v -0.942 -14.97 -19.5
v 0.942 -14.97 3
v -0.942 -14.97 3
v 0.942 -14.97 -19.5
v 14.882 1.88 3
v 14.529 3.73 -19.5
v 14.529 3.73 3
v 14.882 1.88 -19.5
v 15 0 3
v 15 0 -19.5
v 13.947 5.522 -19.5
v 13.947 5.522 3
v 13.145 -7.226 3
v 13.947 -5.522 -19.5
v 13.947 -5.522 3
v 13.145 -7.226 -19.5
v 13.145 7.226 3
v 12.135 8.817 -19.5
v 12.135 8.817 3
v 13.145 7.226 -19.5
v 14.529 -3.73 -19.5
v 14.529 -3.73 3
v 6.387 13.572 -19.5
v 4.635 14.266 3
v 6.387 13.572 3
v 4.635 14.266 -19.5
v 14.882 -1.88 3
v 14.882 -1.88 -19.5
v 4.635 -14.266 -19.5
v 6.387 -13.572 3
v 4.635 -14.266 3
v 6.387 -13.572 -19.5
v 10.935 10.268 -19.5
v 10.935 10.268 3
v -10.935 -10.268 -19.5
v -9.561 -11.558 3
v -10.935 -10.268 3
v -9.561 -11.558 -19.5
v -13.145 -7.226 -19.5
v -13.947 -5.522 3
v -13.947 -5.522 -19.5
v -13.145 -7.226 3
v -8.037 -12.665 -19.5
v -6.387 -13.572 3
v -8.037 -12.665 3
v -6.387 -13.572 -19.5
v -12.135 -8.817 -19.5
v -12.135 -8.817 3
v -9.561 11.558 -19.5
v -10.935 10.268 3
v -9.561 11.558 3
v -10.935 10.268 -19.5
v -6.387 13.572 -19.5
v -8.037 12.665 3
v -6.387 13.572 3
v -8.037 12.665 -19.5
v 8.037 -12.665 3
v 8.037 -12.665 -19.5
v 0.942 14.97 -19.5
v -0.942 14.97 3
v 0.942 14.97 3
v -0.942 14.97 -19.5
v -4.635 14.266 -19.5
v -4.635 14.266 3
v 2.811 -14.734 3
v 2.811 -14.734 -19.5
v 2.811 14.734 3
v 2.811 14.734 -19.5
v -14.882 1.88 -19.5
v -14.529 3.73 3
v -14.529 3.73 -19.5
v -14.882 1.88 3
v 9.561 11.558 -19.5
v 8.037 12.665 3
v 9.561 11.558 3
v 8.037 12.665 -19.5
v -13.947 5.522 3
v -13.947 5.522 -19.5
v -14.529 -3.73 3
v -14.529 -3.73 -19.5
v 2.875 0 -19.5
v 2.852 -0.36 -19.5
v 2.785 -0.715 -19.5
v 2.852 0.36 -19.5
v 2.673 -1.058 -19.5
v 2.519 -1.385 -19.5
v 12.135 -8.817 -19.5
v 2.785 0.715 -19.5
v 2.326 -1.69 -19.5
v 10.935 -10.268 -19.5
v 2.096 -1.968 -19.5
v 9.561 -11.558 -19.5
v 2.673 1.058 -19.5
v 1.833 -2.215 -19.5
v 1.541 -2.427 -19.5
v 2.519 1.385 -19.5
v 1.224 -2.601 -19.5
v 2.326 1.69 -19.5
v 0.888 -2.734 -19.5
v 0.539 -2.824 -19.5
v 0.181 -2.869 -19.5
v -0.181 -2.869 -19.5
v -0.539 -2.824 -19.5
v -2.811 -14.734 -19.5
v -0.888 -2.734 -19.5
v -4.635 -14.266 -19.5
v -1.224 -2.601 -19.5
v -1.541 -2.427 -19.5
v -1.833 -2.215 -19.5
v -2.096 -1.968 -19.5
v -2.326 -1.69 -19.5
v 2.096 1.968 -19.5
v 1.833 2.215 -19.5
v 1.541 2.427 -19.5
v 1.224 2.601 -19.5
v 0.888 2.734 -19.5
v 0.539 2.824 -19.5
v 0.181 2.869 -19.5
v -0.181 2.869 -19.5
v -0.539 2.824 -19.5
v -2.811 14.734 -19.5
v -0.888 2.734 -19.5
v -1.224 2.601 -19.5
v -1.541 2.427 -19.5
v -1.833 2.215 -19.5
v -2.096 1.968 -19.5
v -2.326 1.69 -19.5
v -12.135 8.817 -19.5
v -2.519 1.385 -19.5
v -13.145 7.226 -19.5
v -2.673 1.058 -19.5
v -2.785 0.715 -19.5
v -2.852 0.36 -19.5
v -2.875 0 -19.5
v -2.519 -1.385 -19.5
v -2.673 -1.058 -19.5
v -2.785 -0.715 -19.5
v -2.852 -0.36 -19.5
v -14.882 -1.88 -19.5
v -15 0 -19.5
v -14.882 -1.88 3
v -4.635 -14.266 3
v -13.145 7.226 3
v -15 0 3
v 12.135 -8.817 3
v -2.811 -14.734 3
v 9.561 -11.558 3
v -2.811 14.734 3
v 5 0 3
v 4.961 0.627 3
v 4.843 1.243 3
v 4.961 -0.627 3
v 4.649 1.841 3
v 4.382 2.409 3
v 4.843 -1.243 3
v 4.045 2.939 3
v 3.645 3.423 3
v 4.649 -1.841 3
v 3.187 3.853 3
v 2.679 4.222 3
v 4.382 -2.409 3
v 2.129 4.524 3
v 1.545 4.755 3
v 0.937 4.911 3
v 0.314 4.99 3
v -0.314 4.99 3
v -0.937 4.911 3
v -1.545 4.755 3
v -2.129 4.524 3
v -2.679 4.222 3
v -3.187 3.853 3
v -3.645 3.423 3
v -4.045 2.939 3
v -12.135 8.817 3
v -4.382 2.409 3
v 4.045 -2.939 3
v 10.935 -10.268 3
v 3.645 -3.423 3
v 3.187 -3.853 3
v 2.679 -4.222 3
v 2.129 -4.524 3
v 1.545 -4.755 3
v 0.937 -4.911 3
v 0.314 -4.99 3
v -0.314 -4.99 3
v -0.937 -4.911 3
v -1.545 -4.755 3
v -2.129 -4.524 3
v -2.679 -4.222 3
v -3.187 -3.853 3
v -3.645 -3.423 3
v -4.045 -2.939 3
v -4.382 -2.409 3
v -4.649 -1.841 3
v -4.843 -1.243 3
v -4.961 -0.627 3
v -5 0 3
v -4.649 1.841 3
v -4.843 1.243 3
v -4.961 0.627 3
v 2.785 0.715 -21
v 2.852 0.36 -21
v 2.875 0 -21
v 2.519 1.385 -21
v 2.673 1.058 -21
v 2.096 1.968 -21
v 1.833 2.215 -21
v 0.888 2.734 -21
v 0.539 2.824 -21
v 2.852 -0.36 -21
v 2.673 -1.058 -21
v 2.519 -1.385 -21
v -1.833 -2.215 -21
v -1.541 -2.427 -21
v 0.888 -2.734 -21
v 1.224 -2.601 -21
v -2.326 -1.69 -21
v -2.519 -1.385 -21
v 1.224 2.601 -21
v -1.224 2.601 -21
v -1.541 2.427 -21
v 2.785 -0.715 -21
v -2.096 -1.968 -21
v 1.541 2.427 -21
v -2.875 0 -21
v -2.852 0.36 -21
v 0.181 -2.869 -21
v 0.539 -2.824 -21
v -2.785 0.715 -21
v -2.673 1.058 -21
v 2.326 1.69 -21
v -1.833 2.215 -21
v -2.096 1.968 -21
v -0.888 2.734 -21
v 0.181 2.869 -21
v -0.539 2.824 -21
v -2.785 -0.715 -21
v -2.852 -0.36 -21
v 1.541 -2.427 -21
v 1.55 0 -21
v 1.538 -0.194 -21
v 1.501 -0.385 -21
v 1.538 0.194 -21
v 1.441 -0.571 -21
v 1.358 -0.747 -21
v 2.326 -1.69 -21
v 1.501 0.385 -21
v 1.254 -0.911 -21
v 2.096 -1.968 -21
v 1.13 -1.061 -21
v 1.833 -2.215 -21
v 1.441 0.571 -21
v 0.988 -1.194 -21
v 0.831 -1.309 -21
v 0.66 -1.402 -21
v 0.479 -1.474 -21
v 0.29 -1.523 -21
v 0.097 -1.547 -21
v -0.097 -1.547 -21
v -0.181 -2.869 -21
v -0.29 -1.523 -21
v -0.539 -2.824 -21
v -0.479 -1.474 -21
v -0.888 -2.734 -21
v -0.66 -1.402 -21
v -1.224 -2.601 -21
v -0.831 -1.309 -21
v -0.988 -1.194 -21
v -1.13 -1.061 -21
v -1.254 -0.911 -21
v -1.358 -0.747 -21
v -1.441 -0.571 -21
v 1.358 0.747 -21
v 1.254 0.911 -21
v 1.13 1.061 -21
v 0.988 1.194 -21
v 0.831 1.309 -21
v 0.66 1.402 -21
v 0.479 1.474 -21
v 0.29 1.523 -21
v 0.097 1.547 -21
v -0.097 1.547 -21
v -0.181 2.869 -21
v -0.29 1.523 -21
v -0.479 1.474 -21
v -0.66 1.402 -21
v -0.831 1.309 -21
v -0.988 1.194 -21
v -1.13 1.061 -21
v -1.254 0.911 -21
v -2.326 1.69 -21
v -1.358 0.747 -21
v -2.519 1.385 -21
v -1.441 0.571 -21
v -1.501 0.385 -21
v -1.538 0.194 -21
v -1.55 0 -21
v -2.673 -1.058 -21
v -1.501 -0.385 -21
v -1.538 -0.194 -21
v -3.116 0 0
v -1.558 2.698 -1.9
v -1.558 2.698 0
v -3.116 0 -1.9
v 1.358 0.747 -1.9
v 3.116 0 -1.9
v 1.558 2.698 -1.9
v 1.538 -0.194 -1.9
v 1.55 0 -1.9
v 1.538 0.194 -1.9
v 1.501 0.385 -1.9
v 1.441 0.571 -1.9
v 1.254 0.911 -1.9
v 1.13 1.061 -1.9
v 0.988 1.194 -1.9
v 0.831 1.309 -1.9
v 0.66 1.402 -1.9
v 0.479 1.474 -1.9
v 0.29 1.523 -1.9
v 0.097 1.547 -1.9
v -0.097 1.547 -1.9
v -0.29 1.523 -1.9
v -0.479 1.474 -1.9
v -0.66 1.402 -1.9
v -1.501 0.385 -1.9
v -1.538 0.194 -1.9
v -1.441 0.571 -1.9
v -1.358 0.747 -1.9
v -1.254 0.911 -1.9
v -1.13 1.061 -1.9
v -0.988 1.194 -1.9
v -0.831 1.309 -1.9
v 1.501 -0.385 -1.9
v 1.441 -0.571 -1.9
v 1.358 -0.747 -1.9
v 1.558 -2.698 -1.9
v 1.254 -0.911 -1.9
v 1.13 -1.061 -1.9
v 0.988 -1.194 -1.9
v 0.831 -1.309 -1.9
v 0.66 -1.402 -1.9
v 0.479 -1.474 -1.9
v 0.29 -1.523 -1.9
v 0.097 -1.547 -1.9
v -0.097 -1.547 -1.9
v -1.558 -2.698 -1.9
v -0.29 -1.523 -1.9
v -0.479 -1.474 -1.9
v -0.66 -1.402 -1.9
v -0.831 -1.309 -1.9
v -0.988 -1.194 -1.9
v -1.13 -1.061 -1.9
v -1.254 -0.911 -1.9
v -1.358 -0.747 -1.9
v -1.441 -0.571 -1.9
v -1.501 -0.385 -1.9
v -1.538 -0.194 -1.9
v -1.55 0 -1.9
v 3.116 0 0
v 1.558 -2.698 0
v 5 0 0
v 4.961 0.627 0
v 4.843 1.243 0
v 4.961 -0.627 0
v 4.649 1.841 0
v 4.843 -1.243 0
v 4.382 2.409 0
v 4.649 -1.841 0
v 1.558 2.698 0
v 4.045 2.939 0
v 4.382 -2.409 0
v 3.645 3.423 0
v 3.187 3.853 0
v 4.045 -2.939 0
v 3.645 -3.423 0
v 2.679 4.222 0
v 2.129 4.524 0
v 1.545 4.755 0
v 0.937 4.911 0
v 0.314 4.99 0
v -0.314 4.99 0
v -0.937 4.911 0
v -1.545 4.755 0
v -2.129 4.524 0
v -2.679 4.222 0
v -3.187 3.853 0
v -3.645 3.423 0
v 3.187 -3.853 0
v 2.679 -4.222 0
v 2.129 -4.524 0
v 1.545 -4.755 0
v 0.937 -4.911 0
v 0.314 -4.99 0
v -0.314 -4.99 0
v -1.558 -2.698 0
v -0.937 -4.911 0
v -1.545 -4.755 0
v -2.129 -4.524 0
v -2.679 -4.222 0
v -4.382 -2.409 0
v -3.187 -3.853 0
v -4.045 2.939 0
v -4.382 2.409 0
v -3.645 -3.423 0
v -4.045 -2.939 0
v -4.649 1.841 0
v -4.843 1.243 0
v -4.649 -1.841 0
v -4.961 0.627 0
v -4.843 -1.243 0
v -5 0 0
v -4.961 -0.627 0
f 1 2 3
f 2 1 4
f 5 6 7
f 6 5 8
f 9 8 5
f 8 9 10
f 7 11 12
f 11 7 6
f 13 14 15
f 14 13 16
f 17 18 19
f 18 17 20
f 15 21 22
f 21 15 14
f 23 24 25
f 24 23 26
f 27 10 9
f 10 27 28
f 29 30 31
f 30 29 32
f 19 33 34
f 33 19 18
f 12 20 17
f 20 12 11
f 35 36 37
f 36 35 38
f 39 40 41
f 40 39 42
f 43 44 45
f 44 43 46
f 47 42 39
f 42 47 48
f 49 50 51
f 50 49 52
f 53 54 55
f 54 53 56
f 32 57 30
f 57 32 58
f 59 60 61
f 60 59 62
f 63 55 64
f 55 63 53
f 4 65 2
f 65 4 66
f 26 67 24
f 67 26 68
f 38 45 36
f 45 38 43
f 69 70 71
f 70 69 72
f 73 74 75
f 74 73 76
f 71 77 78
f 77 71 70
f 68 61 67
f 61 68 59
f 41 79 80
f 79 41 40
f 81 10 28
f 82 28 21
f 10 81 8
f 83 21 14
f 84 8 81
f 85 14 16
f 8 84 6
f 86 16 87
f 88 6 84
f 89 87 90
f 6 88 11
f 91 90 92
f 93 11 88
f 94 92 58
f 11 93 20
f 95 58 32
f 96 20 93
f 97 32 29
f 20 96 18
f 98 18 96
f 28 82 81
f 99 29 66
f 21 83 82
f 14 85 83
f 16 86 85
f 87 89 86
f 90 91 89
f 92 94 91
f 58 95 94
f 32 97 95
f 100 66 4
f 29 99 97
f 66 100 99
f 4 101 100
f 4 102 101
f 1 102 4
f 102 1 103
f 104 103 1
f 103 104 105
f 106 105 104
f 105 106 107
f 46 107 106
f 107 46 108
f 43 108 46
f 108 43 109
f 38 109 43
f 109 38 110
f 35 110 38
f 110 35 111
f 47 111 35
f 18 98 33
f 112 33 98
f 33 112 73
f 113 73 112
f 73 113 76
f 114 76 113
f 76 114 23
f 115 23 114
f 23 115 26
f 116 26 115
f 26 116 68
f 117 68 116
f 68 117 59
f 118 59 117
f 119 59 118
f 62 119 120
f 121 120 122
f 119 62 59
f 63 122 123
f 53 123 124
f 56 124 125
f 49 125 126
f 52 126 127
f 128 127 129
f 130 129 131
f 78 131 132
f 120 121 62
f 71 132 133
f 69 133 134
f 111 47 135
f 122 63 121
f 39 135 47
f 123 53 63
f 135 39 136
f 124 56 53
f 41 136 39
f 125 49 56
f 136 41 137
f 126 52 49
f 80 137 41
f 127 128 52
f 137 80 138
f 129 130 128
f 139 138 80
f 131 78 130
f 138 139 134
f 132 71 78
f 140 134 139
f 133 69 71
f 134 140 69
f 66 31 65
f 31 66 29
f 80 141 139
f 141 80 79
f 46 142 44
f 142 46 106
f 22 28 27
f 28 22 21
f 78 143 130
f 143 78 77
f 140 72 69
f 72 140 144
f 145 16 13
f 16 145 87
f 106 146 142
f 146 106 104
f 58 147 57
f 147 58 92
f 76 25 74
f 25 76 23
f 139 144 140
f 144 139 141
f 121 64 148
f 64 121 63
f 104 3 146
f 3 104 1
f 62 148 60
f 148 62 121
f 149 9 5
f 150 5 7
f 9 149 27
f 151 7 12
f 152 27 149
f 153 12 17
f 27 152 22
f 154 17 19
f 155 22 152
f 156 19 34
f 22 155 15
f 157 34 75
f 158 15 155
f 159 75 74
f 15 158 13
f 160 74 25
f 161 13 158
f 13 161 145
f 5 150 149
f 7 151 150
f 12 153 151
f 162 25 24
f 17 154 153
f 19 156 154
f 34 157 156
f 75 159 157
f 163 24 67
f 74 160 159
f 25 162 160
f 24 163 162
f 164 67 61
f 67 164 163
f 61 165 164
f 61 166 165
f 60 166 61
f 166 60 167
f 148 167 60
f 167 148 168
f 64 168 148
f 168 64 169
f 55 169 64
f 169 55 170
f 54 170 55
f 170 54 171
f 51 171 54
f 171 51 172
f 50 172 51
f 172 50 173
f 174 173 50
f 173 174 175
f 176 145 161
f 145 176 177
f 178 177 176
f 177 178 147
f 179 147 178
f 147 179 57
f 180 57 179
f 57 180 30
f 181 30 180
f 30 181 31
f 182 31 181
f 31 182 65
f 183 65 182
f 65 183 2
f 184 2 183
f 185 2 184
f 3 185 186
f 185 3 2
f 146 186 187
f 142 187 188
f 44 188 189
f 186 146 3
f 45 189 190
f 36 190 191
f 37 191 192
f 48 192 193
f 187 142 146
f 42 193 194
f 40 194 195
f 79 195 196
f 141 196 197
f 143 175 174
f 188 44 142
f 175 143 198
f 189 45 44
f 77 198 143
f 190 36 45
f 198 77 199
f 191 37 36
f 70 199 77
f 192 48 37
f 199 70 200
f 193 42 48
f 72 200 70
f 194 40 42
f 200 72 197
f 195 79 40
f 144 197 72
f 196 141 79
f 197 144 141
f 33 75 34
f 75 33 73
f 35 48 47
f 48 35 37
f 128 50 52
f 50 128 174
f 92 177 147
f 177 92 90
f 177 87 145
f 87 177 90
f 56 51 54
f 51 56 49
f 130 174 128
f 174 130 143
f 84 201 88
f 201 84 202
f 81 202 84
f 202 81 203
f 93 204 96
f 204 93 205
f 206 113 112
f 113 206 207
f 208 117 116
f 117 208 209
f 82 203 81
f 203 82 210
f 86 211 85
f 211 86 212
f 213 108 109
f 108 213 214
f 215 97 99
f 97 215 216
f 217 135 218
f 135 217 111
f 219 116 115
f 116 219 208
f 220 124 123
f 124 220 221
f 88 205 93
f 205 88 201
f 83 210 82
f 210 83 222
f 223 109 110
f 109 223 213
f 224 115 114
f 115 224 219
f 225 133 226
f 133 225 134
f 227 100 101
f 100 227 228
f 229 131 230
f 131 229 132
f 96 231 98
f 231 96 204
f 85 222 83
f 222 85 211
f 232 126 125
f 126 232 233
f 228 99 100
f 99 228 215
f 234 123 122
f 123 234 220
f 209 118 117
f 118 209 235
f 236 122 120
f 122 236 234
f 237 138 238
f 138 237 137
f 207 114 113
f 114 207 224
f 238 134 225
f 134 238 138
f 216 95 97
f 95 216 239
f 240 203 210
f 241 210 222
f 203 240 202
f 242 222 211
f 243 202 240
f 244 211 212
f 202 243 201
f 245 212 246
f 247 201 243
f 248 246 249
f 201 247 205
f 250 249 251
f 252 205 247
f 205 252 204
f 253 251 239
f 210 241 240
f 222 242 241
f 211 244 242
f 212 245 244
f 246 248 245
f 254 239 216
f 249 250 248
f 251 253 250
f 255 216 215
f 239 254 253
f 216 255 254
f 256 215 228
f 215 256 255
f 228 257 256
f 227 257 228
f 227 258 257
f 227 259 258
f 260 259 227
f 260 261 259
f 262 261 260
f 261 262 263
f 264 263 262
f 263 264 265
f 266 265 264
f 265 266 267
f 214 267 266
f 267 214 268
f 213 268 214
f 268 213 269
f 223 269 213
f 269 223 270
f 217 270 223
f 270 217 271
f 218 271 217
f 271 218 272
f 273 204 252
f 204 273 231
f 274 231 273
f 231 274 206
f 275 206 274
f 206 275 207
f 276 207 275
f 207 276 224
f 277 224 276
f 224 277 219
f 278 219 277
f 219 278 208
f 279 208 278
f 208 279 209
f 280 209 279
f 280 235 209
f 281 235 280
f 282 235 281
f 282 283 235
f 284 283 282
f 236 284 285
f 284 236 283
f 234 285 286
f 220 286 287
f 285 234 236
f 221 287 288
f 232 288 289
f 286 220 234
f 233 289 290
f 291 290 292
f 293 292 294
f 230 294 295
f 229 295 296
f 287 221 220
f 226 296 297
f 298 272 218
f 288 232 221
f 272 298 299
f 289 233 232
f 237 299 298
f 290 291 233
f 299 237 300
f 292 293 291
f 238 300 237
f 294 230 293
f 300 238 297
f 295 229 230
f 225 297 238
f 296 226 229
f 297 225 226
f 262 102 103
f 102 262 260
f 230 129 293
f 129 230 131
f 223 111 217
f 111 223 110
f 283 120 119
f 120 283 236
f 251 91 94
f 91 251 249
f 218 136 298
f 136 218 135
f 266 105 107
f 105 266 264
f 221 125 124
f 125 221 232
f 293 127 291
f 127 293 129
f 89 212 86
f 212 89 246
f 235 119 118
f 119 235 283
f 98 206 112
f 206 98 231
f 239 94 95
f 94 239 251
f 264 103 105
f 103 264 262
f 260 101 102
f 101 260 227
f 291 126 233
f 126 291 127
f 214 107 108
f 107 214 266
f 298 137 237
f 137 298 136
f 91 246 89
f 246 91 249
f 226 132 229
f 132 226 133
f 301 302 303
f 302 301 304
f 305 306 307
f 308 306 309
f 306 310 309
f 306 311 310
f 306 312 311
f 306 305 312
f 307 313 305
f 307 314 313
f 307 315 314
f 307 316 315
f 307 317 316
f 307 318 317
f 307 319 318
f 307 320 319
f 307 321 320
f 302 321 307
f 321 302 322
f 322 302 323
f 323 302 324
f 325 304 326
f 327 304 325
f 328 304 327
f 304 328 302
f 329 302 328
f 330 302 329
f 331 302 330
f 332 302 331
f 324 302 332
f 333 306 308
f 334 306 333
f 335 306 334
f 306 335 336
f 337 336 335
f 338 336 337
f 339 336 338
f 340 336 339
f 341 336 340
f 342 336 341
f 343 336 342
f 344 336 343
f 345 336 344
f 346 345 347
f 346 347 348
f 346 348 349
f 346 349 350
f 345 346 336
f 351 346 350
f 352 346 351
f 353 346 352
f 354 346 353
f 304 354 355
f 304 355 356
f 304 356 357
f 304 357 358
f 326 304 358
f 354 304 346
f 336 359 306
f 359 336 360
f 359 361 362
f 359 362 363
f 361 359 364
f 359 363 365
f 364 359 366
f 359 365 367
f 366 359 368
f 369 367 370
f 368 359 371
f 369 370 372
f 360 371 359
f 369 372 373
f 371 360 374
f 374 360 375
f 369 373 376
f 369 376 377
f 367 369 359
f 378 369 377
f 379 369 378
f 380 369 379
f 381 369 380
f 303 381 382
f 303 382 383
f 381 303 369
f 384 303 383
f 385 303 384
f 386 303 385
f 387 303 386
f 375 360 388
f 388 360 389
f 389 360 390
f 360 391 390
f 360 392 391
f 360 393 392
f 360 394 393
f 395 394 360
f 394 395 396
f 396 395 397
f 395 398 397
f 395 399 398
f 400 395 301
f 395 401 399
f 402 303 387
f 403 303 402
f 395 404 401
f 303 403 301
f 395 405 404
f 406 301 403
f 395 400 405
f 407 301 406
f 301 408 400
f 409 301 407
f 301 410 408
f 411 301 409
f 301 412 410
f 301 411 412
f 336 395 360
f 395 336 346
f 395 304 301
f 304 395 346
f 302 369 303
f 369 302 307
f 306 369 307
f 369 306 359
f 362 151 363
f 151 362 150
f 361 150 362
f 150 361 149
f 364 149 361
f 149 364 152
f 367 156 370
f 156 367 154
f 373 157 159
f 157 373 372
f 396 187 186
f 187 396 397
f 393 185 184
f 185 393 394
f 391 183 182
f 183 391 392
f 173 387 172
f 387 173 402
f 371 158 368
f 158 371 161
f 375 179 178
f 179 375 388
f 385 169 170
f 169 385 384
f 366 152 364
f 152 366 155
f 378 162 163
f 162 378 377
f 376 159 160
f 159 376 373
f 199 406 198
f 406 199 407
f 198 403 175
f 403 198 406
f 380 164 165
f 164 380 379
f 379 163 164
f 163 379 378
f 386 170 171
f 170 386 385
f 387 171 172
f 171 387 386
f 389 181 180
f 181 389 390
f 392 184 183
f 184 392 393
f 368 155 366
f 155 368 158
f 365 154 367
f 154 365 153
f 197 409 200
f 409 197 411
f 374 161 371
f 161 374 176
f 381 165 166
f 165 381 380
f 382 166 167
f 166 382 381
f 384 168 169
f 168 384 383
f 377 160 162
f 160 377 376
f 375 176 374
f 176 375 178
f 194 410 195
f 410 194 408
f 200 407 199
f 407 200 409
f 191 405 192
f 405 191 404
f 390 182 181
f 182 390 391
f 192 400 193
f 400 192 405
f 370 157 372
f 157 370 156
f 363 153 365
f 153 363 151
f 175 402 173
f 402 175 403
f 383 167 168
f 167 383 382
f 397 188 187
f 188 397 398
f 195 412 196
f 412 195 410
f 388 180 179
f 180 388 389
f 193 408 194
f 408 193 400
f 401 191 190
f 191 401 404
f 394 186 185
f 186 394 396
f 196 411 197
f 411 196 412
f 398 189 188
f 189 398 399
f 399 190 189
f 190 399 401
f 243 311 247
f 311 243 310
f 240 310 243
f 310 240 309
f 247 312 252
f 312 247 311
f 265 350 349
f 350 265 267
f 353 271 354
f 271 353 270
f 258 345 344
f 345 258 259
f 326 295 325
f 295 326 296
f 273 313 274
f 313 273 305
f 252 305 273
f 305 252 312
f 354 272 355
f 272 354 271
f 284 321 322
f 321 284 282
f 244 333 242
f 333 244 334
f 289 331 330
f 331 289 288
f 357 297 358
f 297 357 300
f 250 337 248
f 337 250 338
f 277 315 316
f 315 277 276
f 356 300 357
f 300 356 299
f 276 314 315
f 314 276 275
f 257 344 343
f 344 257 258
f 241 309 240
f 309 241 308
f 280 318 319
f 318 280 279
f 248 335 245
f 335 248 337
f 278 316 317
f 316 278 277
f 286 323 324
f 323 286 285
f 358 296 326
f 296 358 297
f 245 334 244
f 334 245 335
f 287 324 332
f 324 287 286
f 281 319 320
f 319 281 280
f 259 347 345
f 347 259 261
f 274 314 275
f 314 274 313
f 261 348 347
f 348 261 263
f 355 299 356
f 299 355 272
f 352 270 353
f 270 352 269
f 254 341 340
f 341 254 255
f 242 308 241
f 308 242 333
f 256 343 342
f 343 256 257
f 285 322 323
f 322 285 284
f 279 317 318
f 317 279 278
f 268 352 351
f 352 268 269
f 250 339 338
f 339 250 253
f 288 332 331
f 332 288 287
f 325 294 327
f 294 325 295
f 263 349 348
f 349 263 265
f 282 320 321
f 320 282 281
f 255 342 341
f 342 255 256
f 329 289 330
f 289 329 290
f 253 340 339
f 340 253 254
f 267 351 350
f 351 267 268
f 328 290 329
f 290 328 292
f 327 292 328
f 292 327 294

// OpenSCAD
$fn = 50;


difference() {
	union() {
		translate(v = [0, 0, -19.5000000000]) {
			cylinder(h = 22.5000000000, r = 15.0000000000);
		}
		#translate(v = [0, 0, -21.0000000000]) {
			cylinder(h = 21, r = 2.8750000000);
		}
	}
	union() {
		translate(v = [0, 0, 0]) {
			rotate(a = [0, 0, 0]) {
				difference() {
					union() {
						translate(v = [0, 0, -1.9000000000]) {
							linear_extrude(height = 1.9000000000) {
								polygon(points = [[3.1158000000, 0.0000000000], [1.5579000000, 2.6983619531], [-1.5579000000, 2.6983619531], [-3.1158000000, 0.0000000000], [-1.5579000000, -2.6983619531], [1.5579000000, -2.6983619531]]);
							}
						}
					}
					union();
				}
			}
		}
		#cylinder(h = 3, r = 5.0000000000);
		#translate(v = [0, 0, -100.0000000000]) {
			cylinder(h = 200, r = 1.5500000000);
		}
	}
}
